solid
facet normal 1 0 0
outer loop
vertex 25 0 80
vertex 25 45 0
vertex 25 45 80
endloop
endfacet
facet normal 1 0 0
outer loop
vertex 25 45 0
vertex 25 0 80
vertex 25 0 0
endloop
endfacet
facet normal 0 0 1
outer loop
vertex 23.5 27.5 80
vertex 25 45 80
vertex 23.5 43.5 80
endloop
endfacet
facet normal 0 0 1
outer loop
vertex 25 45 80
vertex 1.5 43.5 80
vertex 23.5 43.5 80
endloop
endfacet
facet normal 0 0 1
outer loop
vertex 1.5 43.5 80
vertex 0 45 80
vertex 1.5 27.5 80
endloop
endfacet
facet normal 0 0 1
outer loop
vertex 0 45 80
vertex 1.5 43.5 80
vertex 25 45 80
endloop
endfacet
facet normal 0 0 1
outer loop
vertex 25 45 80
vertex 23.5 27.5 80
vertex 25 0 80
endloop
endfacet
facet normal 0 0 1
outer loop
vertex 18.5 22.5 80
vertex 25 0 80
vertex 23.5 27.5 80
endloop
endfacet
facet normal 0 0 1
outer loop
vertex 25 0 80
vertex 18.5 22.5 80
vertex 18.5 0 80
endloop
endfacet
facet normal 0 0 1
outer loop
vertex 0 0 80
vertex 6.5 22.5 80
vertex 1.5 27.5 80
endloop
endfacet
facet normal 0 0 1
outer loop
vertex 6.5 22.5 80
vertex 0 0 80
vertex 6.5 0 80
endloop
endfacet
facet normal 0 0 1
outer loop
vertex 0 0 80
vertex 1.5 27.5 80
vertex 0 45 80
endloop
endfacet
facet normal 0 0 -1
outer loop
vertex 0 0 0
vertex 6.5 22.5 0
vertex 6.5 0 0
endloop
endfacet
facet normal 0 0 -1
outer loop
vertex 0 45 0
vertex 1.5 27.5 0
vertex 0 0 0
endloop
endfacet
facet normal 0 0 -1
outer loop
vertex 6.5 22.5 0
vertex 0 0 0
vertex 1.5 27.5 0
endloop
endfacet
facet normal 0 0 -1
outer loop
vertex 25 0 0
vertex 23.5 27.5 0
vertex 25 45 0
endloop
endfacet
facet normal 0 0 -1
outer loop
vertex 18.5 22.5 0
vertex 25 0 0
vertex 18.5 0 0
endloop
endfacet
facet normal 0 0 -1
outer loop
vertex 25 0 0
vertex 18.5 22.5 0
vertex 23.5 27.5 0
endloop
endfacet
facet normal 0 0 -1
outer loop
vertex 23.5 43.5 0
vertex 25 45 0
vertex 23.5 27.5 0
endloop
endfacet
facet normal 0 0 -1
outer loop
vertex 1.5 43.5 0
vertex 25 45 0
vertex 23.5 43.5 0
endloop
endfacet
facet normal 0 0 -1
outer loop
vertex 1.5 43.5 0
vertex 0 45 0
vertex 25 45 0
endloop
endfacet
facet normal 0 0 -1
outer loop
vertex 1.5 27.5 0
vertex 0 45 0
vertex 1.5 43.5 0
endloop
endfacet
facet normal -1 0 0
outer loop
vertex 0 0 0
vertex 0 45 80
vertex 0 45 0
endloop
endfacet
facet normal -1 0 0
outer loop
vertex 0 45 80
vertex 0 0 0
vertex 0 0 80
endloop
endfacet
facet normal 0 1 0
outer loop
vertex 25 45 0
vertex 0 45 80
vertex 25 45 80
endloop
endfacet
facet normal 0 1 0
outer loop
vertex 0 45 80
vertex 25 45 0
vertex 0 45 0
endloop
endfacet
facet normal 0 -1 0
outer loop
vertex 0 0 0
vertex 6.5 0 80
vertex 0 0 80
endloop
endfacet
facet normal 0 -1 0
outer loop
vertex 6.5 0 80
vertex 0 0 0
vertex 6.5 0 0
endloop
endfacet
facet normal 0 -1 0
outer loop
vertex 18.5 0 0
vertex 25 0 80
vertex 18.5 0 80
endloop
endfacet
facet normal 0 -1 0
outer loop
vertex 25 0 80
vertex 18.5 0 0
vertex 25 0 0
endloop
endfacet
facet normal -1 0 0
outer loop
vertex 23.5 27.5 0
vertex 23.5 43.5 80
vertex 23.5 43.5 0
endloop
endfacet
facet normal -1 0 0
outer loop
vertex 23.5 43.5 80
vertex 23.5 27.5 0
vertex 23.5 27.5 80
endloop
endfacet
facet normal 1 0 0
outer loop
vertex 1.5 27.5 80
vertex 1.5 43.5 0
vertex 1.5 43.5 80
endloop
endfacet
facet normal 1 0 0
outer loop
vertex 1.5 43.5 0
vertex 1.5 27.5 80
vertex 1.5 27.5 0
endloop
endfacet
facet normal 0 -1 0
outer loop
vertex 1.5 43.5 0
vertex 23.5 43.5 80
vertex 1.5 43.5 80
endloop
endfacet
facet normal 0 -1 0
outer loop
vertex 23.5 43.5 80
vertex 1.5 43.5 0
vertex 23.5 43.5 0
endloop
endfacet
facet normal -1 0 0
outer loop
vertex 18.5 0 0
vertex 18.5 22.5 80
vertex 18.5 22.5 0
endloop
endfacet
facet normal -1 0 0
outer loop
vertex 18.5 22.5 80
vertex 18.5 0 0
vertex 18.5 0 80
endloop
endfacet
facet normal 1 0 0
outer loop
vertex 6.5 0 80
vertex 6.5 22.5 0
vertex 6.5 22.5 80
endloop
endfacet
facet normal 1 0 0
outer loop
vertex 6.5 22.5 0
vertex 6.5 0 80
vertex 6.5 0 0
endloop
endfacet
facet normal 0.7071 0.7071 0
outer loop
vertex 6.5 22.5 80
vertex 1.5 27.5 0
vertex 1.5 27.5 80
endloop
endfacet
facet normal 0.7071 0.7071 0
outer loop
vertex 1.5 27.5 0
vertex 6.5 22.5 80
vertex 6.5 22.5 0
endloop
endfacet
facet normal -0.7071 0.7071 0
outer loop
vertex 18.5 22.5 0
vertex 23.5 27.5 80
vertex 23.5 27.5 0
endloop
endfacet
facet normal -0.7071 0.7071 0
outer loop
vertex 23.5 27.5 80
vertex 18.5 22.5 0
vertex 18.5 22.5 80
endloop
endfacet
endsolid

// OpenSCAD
// Antiskliinnsats

test = false;
tolerance = .5;

spade_blade_width = 20;
spade_tray_gap = 1;
spade_slot_width = spade_blade_width+spade_tray_gap-tolerance;
spade_blade_length = 14;
spade_shaft_width = 10;
spade_slot_depth = 42;
spade_slot_x = 25;

wedge_blade_cut = 5;
wedge_short_length = spade_slot_depth-spade_blade_length-tolerance;
wedge_long_length = spade_slot_depth-spade_blade_length-wedge_blade_cut-tolerance;
wedge_width = (spade_slot_width-spade_shaft_width-tolerance)/2;

wall_thickness = 1.5;
bugfix = $preview ? .1 : 0;

wedge = [
    [0,0],
    [wedge_long_length, 0],
    [wedge_short_length, wedge_width],
    [0,wedge_width]
];

module room(ext_size, wall_thickness=wall_thickness, door_width=0, threshold_height=0) {
    int_size = ext_size - [wall_thickness*2-bugfix,wall_thickness*2-bugfix,-bugfix];
    difference() {
        cube(ext_size);
        translate([wall_thickness,wall_thickness]) {
            cube(int_size);
        }
        if (door_width > 0) {
            translate([ext_size[0]/2-door_width/2, -bugfix, threshold_height]) {
                cube([door_width,wall_thickness+bugfix*2,ext_size[2]-threshold_height+bugfix]);
            }
        }
    }
}

module spade_wedge(top_tolerance=tolerance, test=test) {
    wedge_height = 80-top_tolerance;
    _wedge_height = test ? 10 : wedge_height;

    linear_extrude(_wedge_height) {
        polygon(wedge);
    }
}

module spade_slot_with_wedges() {
    room([spade_slot_x, 45, 80], door_width=spade_shaft_width+spade_tray_gap*2);
    // Left wedge
    translate([wedge_width+wall_thickness,0,0]) {
        rotate([0,0,90]) {
            spade_wedge(top_tolerance=0);
        }
    }
    // Right wedge
    translate([-wedge_width+spade_slot_x-wall_thickness,0,0]) {
        rotate([0,0,90]) {
            mirror([0,1,0]) 
            spade_wedge(top_tolerance=0);
        }
    }
}

//spade_wedge();
spade_slot_with_wedges();
